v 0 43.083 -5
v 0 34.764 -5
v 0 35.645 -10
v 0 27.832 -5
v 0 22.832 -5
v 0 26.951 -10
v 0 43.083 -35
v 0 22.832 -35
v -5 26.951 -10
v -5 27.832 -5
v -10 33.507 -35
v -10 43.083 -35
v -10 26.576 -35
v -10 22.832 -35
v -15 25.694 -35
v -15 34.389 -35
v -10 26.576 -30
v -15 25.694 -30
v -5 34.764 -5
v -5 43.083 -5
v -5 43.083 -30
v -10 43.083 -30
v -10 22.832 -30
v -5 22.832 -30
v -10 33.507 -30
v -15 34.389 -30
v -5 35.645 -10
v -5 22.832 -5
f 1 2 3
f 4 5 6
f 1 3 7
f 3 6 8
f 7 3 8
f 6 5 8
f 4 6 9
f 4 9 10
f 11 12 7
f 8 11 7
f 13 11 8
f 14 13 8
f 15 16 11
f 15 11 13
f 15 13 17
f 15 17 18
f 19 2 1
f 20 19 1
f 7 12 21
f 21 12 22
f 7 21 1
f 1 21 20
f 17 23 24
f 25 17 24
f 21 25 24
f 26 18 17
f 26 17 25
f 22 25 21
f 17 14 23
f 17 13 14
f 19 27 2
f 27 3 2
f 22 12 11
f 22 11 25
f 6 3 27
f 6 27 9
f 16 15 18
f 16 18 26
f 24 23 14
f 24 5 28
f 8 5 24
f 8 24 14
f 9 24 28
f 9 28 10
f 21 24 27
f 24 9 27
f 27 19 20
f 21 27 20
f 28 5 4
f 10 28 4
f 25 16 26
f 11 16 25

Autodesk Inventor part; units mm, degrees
ref_plane "YZ Plane" through (0, 0, 0) normal (1, 0, 0) x (0, 1, 0)
ref_plane "XZ Plane" through (0, 0, 0) normal (0, 1, 0) x (-1, 0, 0)
ref_plane "XY Plane" through (0, 0, 0) normal (0, 0, 1) x (1, 0, 0)
sketch "Sketch1" plane through (0, 0, 0) normal (0, 1, 0) x (-1, 0, 0)
  line L0 (0, 0) -> (0, -35)
  line L1 (0, -35) -> (37, -35)
  line L2 (37, -35) -> (37, -55)
  line L3 (37, -55) -> (48, -55)
  line L4 (48, -55) -> (48, 0)
  line L5 (48, 0) -> (22, 0)
  line L6 (22, 0) -> (22, 0)
  line L7 (22, 0) -> (0, 0)
  dimension "d0" = 35
  dimension "d1" = 37
  dimension "d2" = 20
  dimension "d3" = 11
  dimension "d4" = 55
  dimension "d5" = 26
  dimension "d6" = 0
extrude "Extrusion1" add sketch "Sketch1" along normal blind 50
shell "Shell1" thickness 5 removed faces 3 at (-48, 16.6667, -36.6667) at (-19.6667, 0, -23.3333) at (-19.6667, 50, -23.3333)
sketch "Sketch2" plane through (0, 0, 0) normal (1, 0, 0) x (0, 0, -1)
  line L0 (5, 0) -> (30, 0) projected
  line L1 (5, 0) -> (19, 0)
  line L2 (19, 0) -> (19, 17)
  line L3 (19, 17) -> (5, 17)
  line L4 (5, 17) -> (5, 0)
  point P0 (0, 0)
  dimension "d10" = 17
  dimension "d11" = 0
  dimension "d12" = 11
extrude "Extrusion2" cut sketch "Sketch2" against normal blind 10
sketch "Sketch3" plane through (-48, 0, -55) normal (-1, 0, 0) x (0, 0, 1)
  line L0 (0, 0) -> (0, 50) projected
  line L1 (5, 50) -> (25, 50) projected
  line L2 (0, 0) -> (5, 0)
  line L3 (5, 0) -> (5, 50)
  line L4 (5, 50) -> (0, 50)
  line L5 (0, 50) -> (0, 0)
  point P0 (55, 0)
extrude "Extrusion3" add sketch "Sketch3" along normal blind 15
sketch "Sketch4" plane through (-48, 0, 0) normal (-1, 0, 0) x (0, 0, 1)
  line L0 (-5, 0) -> (0, 0) projected
  line L1 (-5, 0) -> (-5, 50) projected
  line L2 (0, 0) -> (-5, 0)
  line L3 (-5, 0) -> (-5, 50)
  line L4 (-5, 50) -> (0, 50)
  line L5 (0, 50) -> (0, 0)
  point P0 (0, 0)
extrude "Extrusion4" add sketch "Sketch4" along normal blind 15
sketch "Sketch5" plane through (0, 17, -5) normal (0, 0, -1) x (-1, 0, 0)
  circle A0 centre (11.5, -8.5) radius 2.0828
  line L0 (63, -17) -> (0, -17) projected
  line L1 (0, -17) -> (0, 0) projected
  dimension "d19" = 4.1656
  dimension "d20" = 8.5
  dimension "d21" = 11.5
extrude "Extrusion5" cut sketch "Sketch5" against normal blind 15
sketch "Sketch6" plane through (0, 17, -5) normal (0, 0, -1) x (-1, 0, 0)
  circle A0 centre (28.505, 18.46) radius 2.0828
  line L0 (63, -17) -> (0, -17) projected
  line L1 (5, 0) -> (5, 33) projected
  dimension "d24" = 4.1656
  dimension "d25" = 35.46
  dimension "d26" = 23.505
extrude "Extrusion6" cut sketch "Sketch6" against normal blind 15
sketch "Sketch7" plane through (0, 17, -5) normal (0, 0, -1) x (-1, 0, 0)
  circle A0 centre (58.5, 19) radius 2.0828
  line L0 (63, 33) -> (63, -17) projected
  line L1 (5, 33) -> (63, 33) projected
  point P0 (0, -17)
  dimension "d29" = 4.1656
  dimension "d30" = 4.5
  dimension "d31" = 14
extrude "Extrusion7" cut sketch "Sketch7" against normal blind 15
sketch "Sketch13" plane through (0, 0, -35) normal (0, 0, -1) x (-1, 0, 0)
  circle A0 centre (11.5, 8.5) radius 2.0828
  line L0 (0, 0) -> (37, 0) projected
  line L1 (0, 0) -> (0, 50) projected
  dimension "d41" = 4.1656
  dimension "d42" = 8.5
  dimension "d43" = 11.5
extrude "Extrusion9" cut sketch "Sketch13" against normal blind 15
sketch "Sketch14" plane through (-37, 0, -55) normal (0, 0, -1) x (-1, 0, 0)
  circle A0 centre (-8.495, 35.46) radius 2.0828
  line L0 (-37, 0) -> (-37, 50) projected
  line L1 (0, 0) -> (26, 0) projected
  dimension "d46" = 4.1656
  dimension "d47" = 28.505
  dimension "d48" = 35.46
extrude "Extrusion10" cut sketch "Sketch14" against normal blind 15
sketch "Sketch15" plane through (-37, 0, -55) normal (0, 0, -1) x (-1, 0, 0)
  circle A0 centre (21.5, 36) radius 2.0828
  line L0 (0, 0) -> (26, 0) projected
  line L1 (26, 50) -> (26, 0) projected
  point P0 (-37, 0)
  dimension "d51" = 4.1656
  dimension "d52" = 36
  dimension "d53" = 4.5
extrude "Extrusion11" cut sketch "Sketch15" against normal blind 15
sketch "Sketch16" plane through (-42, 0, -30) normal (-1, 0, 0) x (0, 0, 1)
  line L0 (0, 0) -> (-5, 0)
  line L1 (-5, 0) -> (-5, 50)
  line L2 (-5, 50) -> (0, 50)
  line L3 (0, 50) -> (0, 0)
  point P0 (30, 0)
  dimension "d56" = 5
  dimension "d57" = 50
extrude "Extrusion12" add sketch "Sketch16" along normal blind 21
sketch "Sketch17" plane through (-5, 0, -30) normal (0, 0, 1) x (1, 0, 0)
  circle A0 centre (-23.505, 35.46) radius 2.0828
  line L0 (0, 0) -> (0, 50) projected
  line L1 (0, 0) -> (-58, 0) projected
  point P0 (5, 0)
  dimension "d60" = 4.1656
  dimension "d61" = 23.505
  dimension "d62" = 35.46
extrude "Extrusion13" cut sketch "Sketch17" against normal blind 10
sketch "Sketch18" plane through (-42, 0, -35) normal (0, 0, -1) x (-1, 0, 0)
  circle A0 centre (16.5, 36) radius 2.0828
  line L0 (21, 50) -> (21, 0) projected
  line L1 (0, 0) -> (21, 0) projected
  point P0 (-42, 0)
  dimension "d65" = 4.1656
  dimension "d67" = 36
  dimension "d70" = 4.5
extrude "Extrusion14" cut sketch "Sketch18" against normal blind 10
sketch "Sketch20" plane through (-63, 0, 0) normal (-1, 0, 0) x (0, 0, 1)
  line L0 (0, 0) -> (-5, 0) projected
  line L1 (-5, 17) -> (-5, 50) projected
  line L2 (0, 0) -> (-5, 0)
  line L3 (-5, 0) -> (-5, 50)
  line L4 (-5, 50) -> (0, 50)
  line L5 (0, 50) -> (0, 0)
extrude "Extrusion15" add sketch "Sketch20" along normal blind 2.583
sketch "Sketch21" plane through (-63, 0, -30) normal (-1, 0, 0) x (0, 0, 1)
  line L0 (-20, 50) -> (-5, 50) projected
  line L1 (11, 0) -> (0, 0) projected
  line L2 (-5, 50) -> (0, 50)
  line L3 (0, 50) -> (0, 0)
  line L4 (0, 0) -> (-5, 0)
  line L5 (-5, 0) -> (-5, 50)
  point P0 (30, 0)
extrude "Extrusion16" add sketch "Sketch21" along normal blind 2.583
sketch "Sketch22" plane through (-63, 0, -55) normal (-1, 0, 0) x (0, 0, 1)
  line L0 (0, 0) -> (0, 50) projected
  line L1 (5, 0) -> (5, 50) projected
  line L2 (0, 50) -> (5, 50)
  line L3 (5, 50) -> (5, 0)
  line L4 (5, 0) -> (0, 0)
  line L5 (0, 0) -> (0, 50)
  point P0 (55, 0)
extrude "Extrusion17" add sketch "Sketch22" along normal blind 2.583
sketch "Sketch23" plane through (0, 0, 0) normal (0, 0, 1) x (1, 0, 0)
  line L0 (0, 50) -> (-37, 50) projected
  line L1 (-65.583, 50) -> (-65.583, 0) projected
  line L2 (0, 50) -> (-65.583, 50)
  line L3 (-65.583, 50) -> (-65.583, 43.083)
  line L4 (-65.583, 43.083) -> (0, 43.083)
  line L5 (0, 43.083) -> (0, 50)
  point P0 (0, 0)
  dimension "d77" = 6.917
extrude "Extrusion18" cut sketch "Sketch23" against normal blind 100
sketch "Sketch24" plane through (0, 0, -35) normal (0, 0, -1) x (-1, 0, 0)
  line L0 (0, 0) -> (65.583, 0) projected
  line L1 (31.0052, 0) -> (26.0052, 0)
  line L2 (26.0052, 5) -> (31.0052, 5)
  circle A0 centre (28.505, 35.46) radius 2.0828 projected
  line L3 (26.0052, 5) -> (25.0052, 5)
  line L4 (25.0052, 5) -> (26.0052, 0)
  line L5 (31.0052, 5) -> (32.0052, 5)
  line L6 (32.0052, 5) -> (31.0052, 0)
  dimension "d80" = 5
  dimension "d81" = 5
  dimension "d83" = 1
  dimension "d84" = 1
extrude "Extrusion19" cut sketch "Sketch24" against normal blind 100 contours L4 L3 L2 L5 L6 L0
sketch "Sketch25" plane through (0, 0, 0) normal (1, 0, 0) x (0, 0, -1)
  line L0 (0, 0) -> (5, 0) projected
  line L1 (35, 43.083) -> (0, 43.083) projected
  line L2 (0, 0) -> (5, 0)
  line L3 (5, 0) -> (5, 43.083)
  line L4 (5, 43.083) -> (0, 43.083)
  line L5 (0, 43.083) -> (0, 0)
  dimension "d87" = 5
extrude "Extrusion20" cut sketch "Sketch25" against normal blind 100
sketch "Sketch26" plane through (0, 0, -19) normal (1, 0, 0) x (0, 0, -1)
  line L0 (-9, 35.6451) -> (-9, 26.9508)
  line L1 (-9, 26.9508) -> (-14, 27.8324)
  line L2 (-9, 35.6451) -> (-14, 34.7635)
  line L3 (-9, 35.6451) -> (-3.9229, 35.6451) construction
  line L4 (-14, 34.7635) -> (-14, 27.8324)
  line L5 (-14, 43.083) -> (-14, 17) projected
  line L6 (-14, 17) -> (0, 17) projected
  line L7 (16, 43.083) -> (-14, 43.083) projected
  point P0 (0, 0)
  dimension "d90" = 8.6943
  dimension "d91" = 80
  dimension "d92" = 170
  dimension "d93" = 0
  dimension "d94" = 5
  dimension "d128" = 7.4379
extrude "Extrusion21" cut sketch "Sketch26" against normal blind 100
sketch "Sketch27" plane through (-37, 0, -35) normal (1, 0, 0) x (0, 0, -1)
  line L0 (5, 17) -> (5, 8.3057)
  line L1 (5, 8.3057) -> (0, 9.1873)
  line L2 (5, 17) -> (0, 16.1184)
  line L3 (5, 17) -> (10.0771, 17) construction
  line L4 (0, 16.1184) -> (0, 9.1873)
  line L5 (0, 0) -> (0, 43.083) projected
  line L6 (20, 43.083) -> (0, 43.083) projected
  dimension "d98" = 8.6943
  dimension "d99" = 80
  dimension "d100" = 170
  dimension "d102" = 5
  dimension "d104" = 0
  dimension "d105" = 26.083
sketch "Sketch28" plane through (-37, 0, -35) normal (1, 0, 0) x (0, 0, -1)
  line L0 (5, 34.3887) -> (5, 25.6944)
  line L1 (5, 25.6944) -> (0, 26.576)
  line L2 (5, 34.3887) -> (0, 33.507)
  line L3 (5, 34.3887) -> (10.0771, 34.3887) construction
  line L4 (0, 33.507) -> (0, 26.576)
  dimension "d106" = 8.6943
  dimension "d107" = 80
  dimension "d108" = 170
  dimension "d109" = 5
extrude "Extrusion22" add sketch "Sketch27" along normal blind 5
extrude "Extrusion23" add sketch "Sketch28" along normal blind 5
sketch "Sketch29" plane through (-65.583, 43.083, -30) normal (0, 1, 0) x (1, 0, 0)
  line L0 (33.583, 5) -> (28.583, 5) projected
  line L1 (0, 25) -> (28.583, 25) projected
  line L2 (28.583, 5) -> (0, 5)
  line L3 (0, 5) -> (0, 25)
  line L4 (0, 25) -> (28.583, 25)
  line L5 (28.583, 25) -> (28.583, 5)
  point P0 (65.583, -30)
extrude "Extrusion24" cut sketch "Sketch29" against normal blind 100
sketch "Sketch31" plane through (-65.583, 43.083, -30) normal (0, 0, 1) x (1, 0, 0)
  line L0 (60.583, -8.3195) -> (60.583, 0) projected
  line L1 (60.583, 0) -> (-3.7083, 0)
  line L2 (-3.7083, 0) -> (-3.7083, -46.9701)
  line L3 (-3.7083, -46.9701) -> (60.583, -46.9701)
  line L4 (60.583, -46.9701) -> (60.583, 0)
  point P0 (65.583, -43.083)
extrude "Extrusion25" cut sketch "Sketch31" against normal blind 100
sketch "Sketch32" plane through (0, 0, -35) normal (0, 0, -1) x (-1, 0, 0)
  line L0 (10, 34.3887) -> (10, 25.6944)
  line L1 (10, 25.6944) -> (5, 26.576)
  line L2 (10, 34.3887) -> (5, 33.507)
  line L3 (10, 34.3887) -> (15.0771, 34.3887) construction
  line L4 (5, 33.507) -> (5, 26.576)
  line L5 (5, 0) -> (5, 43.083) projected
  line L6 (5, 43.083) -> (0, 43.083) projected
  dimension "d120" = 8.6943
  dimension "d121" = 80
  dimension "d122" = 170
  dimension "d123" = 5
  dimension "d124" = 0
  dimension "d125" = 8.6943
extrude "Extrusion26" add sketch "Sketch32" against normal blind 5
sketch "Sketch33" plane through (0, 0, -19) normal (1, 0, 0) x (0, 0, -1)
  line L0 (0, 0) -> (16, 0) projected
  line L1 (16, 0) -> (-15.3687, 0)
  line L2 (-15.3687, 0) -> (-15.3687, 22.832)
  line L3 (-15.3687, 22.832) -> (16, 22.832)
  line L4 (16, 22.832) -> (16, 0)
  point P0 (-19, 0)
  dimension "d130" = 22.832
extrude "Extrusion27" cut sketch "Sketch33" against normal blind 10
sketch "Sketch34" plane through (-10, 25.6944, -35) normal (-1, 0, 0) x (0, 0, 1)
  line L0 (0, -2.8624) -> (30, -2.8624) projected
  line L1 (0, 17.3886) -> (30, 17.3886) projected
  line L2 (0, -2.8624) -> (5, -2.8624)
  line L3 (5, -2.8624) -> (5, 17.3886)
  line L4 (5, 17.3886) -> (0, 17.3886)
  line L5 (0, 17.3886) -> (0, -2.8624)
  point P0 (35, -25.6944)
  dimension "d133" = 5
extrude "Extrusion28" add sketch "Sketch34" against normal blind 5
sketch "Sketch35" plane through (0, 43.083, -35) normal (0, 0, -1) x (-1, 0, 0)
  line L0 (10, -20.251) -> (10, 0) projected
  line L1 (10, -16.507) -> (14.9999, -17.3886)
  line L2 (10, -16.507) -> (15.077, -16.507) construction
  line L3 (14.9999, -17.3886) -> (14.9999, -8.6944)
  line L4 (14.9999, -8.6944) -> (10, -9.576)
  line L5 (10, -9.576) -> (10, -16.507)
  point P0 (0, -43.083)
  dimension "d136" = 5.077
  dimension "d137" = 10
  dimension "d138" = 5.077
  dimension "d139" = 3.744
  dimension "d140" = 6.931
extrude "Extrusion29" add sketch "Sketch35" against normal blind 5
properties part number "Frame VG01-2"
